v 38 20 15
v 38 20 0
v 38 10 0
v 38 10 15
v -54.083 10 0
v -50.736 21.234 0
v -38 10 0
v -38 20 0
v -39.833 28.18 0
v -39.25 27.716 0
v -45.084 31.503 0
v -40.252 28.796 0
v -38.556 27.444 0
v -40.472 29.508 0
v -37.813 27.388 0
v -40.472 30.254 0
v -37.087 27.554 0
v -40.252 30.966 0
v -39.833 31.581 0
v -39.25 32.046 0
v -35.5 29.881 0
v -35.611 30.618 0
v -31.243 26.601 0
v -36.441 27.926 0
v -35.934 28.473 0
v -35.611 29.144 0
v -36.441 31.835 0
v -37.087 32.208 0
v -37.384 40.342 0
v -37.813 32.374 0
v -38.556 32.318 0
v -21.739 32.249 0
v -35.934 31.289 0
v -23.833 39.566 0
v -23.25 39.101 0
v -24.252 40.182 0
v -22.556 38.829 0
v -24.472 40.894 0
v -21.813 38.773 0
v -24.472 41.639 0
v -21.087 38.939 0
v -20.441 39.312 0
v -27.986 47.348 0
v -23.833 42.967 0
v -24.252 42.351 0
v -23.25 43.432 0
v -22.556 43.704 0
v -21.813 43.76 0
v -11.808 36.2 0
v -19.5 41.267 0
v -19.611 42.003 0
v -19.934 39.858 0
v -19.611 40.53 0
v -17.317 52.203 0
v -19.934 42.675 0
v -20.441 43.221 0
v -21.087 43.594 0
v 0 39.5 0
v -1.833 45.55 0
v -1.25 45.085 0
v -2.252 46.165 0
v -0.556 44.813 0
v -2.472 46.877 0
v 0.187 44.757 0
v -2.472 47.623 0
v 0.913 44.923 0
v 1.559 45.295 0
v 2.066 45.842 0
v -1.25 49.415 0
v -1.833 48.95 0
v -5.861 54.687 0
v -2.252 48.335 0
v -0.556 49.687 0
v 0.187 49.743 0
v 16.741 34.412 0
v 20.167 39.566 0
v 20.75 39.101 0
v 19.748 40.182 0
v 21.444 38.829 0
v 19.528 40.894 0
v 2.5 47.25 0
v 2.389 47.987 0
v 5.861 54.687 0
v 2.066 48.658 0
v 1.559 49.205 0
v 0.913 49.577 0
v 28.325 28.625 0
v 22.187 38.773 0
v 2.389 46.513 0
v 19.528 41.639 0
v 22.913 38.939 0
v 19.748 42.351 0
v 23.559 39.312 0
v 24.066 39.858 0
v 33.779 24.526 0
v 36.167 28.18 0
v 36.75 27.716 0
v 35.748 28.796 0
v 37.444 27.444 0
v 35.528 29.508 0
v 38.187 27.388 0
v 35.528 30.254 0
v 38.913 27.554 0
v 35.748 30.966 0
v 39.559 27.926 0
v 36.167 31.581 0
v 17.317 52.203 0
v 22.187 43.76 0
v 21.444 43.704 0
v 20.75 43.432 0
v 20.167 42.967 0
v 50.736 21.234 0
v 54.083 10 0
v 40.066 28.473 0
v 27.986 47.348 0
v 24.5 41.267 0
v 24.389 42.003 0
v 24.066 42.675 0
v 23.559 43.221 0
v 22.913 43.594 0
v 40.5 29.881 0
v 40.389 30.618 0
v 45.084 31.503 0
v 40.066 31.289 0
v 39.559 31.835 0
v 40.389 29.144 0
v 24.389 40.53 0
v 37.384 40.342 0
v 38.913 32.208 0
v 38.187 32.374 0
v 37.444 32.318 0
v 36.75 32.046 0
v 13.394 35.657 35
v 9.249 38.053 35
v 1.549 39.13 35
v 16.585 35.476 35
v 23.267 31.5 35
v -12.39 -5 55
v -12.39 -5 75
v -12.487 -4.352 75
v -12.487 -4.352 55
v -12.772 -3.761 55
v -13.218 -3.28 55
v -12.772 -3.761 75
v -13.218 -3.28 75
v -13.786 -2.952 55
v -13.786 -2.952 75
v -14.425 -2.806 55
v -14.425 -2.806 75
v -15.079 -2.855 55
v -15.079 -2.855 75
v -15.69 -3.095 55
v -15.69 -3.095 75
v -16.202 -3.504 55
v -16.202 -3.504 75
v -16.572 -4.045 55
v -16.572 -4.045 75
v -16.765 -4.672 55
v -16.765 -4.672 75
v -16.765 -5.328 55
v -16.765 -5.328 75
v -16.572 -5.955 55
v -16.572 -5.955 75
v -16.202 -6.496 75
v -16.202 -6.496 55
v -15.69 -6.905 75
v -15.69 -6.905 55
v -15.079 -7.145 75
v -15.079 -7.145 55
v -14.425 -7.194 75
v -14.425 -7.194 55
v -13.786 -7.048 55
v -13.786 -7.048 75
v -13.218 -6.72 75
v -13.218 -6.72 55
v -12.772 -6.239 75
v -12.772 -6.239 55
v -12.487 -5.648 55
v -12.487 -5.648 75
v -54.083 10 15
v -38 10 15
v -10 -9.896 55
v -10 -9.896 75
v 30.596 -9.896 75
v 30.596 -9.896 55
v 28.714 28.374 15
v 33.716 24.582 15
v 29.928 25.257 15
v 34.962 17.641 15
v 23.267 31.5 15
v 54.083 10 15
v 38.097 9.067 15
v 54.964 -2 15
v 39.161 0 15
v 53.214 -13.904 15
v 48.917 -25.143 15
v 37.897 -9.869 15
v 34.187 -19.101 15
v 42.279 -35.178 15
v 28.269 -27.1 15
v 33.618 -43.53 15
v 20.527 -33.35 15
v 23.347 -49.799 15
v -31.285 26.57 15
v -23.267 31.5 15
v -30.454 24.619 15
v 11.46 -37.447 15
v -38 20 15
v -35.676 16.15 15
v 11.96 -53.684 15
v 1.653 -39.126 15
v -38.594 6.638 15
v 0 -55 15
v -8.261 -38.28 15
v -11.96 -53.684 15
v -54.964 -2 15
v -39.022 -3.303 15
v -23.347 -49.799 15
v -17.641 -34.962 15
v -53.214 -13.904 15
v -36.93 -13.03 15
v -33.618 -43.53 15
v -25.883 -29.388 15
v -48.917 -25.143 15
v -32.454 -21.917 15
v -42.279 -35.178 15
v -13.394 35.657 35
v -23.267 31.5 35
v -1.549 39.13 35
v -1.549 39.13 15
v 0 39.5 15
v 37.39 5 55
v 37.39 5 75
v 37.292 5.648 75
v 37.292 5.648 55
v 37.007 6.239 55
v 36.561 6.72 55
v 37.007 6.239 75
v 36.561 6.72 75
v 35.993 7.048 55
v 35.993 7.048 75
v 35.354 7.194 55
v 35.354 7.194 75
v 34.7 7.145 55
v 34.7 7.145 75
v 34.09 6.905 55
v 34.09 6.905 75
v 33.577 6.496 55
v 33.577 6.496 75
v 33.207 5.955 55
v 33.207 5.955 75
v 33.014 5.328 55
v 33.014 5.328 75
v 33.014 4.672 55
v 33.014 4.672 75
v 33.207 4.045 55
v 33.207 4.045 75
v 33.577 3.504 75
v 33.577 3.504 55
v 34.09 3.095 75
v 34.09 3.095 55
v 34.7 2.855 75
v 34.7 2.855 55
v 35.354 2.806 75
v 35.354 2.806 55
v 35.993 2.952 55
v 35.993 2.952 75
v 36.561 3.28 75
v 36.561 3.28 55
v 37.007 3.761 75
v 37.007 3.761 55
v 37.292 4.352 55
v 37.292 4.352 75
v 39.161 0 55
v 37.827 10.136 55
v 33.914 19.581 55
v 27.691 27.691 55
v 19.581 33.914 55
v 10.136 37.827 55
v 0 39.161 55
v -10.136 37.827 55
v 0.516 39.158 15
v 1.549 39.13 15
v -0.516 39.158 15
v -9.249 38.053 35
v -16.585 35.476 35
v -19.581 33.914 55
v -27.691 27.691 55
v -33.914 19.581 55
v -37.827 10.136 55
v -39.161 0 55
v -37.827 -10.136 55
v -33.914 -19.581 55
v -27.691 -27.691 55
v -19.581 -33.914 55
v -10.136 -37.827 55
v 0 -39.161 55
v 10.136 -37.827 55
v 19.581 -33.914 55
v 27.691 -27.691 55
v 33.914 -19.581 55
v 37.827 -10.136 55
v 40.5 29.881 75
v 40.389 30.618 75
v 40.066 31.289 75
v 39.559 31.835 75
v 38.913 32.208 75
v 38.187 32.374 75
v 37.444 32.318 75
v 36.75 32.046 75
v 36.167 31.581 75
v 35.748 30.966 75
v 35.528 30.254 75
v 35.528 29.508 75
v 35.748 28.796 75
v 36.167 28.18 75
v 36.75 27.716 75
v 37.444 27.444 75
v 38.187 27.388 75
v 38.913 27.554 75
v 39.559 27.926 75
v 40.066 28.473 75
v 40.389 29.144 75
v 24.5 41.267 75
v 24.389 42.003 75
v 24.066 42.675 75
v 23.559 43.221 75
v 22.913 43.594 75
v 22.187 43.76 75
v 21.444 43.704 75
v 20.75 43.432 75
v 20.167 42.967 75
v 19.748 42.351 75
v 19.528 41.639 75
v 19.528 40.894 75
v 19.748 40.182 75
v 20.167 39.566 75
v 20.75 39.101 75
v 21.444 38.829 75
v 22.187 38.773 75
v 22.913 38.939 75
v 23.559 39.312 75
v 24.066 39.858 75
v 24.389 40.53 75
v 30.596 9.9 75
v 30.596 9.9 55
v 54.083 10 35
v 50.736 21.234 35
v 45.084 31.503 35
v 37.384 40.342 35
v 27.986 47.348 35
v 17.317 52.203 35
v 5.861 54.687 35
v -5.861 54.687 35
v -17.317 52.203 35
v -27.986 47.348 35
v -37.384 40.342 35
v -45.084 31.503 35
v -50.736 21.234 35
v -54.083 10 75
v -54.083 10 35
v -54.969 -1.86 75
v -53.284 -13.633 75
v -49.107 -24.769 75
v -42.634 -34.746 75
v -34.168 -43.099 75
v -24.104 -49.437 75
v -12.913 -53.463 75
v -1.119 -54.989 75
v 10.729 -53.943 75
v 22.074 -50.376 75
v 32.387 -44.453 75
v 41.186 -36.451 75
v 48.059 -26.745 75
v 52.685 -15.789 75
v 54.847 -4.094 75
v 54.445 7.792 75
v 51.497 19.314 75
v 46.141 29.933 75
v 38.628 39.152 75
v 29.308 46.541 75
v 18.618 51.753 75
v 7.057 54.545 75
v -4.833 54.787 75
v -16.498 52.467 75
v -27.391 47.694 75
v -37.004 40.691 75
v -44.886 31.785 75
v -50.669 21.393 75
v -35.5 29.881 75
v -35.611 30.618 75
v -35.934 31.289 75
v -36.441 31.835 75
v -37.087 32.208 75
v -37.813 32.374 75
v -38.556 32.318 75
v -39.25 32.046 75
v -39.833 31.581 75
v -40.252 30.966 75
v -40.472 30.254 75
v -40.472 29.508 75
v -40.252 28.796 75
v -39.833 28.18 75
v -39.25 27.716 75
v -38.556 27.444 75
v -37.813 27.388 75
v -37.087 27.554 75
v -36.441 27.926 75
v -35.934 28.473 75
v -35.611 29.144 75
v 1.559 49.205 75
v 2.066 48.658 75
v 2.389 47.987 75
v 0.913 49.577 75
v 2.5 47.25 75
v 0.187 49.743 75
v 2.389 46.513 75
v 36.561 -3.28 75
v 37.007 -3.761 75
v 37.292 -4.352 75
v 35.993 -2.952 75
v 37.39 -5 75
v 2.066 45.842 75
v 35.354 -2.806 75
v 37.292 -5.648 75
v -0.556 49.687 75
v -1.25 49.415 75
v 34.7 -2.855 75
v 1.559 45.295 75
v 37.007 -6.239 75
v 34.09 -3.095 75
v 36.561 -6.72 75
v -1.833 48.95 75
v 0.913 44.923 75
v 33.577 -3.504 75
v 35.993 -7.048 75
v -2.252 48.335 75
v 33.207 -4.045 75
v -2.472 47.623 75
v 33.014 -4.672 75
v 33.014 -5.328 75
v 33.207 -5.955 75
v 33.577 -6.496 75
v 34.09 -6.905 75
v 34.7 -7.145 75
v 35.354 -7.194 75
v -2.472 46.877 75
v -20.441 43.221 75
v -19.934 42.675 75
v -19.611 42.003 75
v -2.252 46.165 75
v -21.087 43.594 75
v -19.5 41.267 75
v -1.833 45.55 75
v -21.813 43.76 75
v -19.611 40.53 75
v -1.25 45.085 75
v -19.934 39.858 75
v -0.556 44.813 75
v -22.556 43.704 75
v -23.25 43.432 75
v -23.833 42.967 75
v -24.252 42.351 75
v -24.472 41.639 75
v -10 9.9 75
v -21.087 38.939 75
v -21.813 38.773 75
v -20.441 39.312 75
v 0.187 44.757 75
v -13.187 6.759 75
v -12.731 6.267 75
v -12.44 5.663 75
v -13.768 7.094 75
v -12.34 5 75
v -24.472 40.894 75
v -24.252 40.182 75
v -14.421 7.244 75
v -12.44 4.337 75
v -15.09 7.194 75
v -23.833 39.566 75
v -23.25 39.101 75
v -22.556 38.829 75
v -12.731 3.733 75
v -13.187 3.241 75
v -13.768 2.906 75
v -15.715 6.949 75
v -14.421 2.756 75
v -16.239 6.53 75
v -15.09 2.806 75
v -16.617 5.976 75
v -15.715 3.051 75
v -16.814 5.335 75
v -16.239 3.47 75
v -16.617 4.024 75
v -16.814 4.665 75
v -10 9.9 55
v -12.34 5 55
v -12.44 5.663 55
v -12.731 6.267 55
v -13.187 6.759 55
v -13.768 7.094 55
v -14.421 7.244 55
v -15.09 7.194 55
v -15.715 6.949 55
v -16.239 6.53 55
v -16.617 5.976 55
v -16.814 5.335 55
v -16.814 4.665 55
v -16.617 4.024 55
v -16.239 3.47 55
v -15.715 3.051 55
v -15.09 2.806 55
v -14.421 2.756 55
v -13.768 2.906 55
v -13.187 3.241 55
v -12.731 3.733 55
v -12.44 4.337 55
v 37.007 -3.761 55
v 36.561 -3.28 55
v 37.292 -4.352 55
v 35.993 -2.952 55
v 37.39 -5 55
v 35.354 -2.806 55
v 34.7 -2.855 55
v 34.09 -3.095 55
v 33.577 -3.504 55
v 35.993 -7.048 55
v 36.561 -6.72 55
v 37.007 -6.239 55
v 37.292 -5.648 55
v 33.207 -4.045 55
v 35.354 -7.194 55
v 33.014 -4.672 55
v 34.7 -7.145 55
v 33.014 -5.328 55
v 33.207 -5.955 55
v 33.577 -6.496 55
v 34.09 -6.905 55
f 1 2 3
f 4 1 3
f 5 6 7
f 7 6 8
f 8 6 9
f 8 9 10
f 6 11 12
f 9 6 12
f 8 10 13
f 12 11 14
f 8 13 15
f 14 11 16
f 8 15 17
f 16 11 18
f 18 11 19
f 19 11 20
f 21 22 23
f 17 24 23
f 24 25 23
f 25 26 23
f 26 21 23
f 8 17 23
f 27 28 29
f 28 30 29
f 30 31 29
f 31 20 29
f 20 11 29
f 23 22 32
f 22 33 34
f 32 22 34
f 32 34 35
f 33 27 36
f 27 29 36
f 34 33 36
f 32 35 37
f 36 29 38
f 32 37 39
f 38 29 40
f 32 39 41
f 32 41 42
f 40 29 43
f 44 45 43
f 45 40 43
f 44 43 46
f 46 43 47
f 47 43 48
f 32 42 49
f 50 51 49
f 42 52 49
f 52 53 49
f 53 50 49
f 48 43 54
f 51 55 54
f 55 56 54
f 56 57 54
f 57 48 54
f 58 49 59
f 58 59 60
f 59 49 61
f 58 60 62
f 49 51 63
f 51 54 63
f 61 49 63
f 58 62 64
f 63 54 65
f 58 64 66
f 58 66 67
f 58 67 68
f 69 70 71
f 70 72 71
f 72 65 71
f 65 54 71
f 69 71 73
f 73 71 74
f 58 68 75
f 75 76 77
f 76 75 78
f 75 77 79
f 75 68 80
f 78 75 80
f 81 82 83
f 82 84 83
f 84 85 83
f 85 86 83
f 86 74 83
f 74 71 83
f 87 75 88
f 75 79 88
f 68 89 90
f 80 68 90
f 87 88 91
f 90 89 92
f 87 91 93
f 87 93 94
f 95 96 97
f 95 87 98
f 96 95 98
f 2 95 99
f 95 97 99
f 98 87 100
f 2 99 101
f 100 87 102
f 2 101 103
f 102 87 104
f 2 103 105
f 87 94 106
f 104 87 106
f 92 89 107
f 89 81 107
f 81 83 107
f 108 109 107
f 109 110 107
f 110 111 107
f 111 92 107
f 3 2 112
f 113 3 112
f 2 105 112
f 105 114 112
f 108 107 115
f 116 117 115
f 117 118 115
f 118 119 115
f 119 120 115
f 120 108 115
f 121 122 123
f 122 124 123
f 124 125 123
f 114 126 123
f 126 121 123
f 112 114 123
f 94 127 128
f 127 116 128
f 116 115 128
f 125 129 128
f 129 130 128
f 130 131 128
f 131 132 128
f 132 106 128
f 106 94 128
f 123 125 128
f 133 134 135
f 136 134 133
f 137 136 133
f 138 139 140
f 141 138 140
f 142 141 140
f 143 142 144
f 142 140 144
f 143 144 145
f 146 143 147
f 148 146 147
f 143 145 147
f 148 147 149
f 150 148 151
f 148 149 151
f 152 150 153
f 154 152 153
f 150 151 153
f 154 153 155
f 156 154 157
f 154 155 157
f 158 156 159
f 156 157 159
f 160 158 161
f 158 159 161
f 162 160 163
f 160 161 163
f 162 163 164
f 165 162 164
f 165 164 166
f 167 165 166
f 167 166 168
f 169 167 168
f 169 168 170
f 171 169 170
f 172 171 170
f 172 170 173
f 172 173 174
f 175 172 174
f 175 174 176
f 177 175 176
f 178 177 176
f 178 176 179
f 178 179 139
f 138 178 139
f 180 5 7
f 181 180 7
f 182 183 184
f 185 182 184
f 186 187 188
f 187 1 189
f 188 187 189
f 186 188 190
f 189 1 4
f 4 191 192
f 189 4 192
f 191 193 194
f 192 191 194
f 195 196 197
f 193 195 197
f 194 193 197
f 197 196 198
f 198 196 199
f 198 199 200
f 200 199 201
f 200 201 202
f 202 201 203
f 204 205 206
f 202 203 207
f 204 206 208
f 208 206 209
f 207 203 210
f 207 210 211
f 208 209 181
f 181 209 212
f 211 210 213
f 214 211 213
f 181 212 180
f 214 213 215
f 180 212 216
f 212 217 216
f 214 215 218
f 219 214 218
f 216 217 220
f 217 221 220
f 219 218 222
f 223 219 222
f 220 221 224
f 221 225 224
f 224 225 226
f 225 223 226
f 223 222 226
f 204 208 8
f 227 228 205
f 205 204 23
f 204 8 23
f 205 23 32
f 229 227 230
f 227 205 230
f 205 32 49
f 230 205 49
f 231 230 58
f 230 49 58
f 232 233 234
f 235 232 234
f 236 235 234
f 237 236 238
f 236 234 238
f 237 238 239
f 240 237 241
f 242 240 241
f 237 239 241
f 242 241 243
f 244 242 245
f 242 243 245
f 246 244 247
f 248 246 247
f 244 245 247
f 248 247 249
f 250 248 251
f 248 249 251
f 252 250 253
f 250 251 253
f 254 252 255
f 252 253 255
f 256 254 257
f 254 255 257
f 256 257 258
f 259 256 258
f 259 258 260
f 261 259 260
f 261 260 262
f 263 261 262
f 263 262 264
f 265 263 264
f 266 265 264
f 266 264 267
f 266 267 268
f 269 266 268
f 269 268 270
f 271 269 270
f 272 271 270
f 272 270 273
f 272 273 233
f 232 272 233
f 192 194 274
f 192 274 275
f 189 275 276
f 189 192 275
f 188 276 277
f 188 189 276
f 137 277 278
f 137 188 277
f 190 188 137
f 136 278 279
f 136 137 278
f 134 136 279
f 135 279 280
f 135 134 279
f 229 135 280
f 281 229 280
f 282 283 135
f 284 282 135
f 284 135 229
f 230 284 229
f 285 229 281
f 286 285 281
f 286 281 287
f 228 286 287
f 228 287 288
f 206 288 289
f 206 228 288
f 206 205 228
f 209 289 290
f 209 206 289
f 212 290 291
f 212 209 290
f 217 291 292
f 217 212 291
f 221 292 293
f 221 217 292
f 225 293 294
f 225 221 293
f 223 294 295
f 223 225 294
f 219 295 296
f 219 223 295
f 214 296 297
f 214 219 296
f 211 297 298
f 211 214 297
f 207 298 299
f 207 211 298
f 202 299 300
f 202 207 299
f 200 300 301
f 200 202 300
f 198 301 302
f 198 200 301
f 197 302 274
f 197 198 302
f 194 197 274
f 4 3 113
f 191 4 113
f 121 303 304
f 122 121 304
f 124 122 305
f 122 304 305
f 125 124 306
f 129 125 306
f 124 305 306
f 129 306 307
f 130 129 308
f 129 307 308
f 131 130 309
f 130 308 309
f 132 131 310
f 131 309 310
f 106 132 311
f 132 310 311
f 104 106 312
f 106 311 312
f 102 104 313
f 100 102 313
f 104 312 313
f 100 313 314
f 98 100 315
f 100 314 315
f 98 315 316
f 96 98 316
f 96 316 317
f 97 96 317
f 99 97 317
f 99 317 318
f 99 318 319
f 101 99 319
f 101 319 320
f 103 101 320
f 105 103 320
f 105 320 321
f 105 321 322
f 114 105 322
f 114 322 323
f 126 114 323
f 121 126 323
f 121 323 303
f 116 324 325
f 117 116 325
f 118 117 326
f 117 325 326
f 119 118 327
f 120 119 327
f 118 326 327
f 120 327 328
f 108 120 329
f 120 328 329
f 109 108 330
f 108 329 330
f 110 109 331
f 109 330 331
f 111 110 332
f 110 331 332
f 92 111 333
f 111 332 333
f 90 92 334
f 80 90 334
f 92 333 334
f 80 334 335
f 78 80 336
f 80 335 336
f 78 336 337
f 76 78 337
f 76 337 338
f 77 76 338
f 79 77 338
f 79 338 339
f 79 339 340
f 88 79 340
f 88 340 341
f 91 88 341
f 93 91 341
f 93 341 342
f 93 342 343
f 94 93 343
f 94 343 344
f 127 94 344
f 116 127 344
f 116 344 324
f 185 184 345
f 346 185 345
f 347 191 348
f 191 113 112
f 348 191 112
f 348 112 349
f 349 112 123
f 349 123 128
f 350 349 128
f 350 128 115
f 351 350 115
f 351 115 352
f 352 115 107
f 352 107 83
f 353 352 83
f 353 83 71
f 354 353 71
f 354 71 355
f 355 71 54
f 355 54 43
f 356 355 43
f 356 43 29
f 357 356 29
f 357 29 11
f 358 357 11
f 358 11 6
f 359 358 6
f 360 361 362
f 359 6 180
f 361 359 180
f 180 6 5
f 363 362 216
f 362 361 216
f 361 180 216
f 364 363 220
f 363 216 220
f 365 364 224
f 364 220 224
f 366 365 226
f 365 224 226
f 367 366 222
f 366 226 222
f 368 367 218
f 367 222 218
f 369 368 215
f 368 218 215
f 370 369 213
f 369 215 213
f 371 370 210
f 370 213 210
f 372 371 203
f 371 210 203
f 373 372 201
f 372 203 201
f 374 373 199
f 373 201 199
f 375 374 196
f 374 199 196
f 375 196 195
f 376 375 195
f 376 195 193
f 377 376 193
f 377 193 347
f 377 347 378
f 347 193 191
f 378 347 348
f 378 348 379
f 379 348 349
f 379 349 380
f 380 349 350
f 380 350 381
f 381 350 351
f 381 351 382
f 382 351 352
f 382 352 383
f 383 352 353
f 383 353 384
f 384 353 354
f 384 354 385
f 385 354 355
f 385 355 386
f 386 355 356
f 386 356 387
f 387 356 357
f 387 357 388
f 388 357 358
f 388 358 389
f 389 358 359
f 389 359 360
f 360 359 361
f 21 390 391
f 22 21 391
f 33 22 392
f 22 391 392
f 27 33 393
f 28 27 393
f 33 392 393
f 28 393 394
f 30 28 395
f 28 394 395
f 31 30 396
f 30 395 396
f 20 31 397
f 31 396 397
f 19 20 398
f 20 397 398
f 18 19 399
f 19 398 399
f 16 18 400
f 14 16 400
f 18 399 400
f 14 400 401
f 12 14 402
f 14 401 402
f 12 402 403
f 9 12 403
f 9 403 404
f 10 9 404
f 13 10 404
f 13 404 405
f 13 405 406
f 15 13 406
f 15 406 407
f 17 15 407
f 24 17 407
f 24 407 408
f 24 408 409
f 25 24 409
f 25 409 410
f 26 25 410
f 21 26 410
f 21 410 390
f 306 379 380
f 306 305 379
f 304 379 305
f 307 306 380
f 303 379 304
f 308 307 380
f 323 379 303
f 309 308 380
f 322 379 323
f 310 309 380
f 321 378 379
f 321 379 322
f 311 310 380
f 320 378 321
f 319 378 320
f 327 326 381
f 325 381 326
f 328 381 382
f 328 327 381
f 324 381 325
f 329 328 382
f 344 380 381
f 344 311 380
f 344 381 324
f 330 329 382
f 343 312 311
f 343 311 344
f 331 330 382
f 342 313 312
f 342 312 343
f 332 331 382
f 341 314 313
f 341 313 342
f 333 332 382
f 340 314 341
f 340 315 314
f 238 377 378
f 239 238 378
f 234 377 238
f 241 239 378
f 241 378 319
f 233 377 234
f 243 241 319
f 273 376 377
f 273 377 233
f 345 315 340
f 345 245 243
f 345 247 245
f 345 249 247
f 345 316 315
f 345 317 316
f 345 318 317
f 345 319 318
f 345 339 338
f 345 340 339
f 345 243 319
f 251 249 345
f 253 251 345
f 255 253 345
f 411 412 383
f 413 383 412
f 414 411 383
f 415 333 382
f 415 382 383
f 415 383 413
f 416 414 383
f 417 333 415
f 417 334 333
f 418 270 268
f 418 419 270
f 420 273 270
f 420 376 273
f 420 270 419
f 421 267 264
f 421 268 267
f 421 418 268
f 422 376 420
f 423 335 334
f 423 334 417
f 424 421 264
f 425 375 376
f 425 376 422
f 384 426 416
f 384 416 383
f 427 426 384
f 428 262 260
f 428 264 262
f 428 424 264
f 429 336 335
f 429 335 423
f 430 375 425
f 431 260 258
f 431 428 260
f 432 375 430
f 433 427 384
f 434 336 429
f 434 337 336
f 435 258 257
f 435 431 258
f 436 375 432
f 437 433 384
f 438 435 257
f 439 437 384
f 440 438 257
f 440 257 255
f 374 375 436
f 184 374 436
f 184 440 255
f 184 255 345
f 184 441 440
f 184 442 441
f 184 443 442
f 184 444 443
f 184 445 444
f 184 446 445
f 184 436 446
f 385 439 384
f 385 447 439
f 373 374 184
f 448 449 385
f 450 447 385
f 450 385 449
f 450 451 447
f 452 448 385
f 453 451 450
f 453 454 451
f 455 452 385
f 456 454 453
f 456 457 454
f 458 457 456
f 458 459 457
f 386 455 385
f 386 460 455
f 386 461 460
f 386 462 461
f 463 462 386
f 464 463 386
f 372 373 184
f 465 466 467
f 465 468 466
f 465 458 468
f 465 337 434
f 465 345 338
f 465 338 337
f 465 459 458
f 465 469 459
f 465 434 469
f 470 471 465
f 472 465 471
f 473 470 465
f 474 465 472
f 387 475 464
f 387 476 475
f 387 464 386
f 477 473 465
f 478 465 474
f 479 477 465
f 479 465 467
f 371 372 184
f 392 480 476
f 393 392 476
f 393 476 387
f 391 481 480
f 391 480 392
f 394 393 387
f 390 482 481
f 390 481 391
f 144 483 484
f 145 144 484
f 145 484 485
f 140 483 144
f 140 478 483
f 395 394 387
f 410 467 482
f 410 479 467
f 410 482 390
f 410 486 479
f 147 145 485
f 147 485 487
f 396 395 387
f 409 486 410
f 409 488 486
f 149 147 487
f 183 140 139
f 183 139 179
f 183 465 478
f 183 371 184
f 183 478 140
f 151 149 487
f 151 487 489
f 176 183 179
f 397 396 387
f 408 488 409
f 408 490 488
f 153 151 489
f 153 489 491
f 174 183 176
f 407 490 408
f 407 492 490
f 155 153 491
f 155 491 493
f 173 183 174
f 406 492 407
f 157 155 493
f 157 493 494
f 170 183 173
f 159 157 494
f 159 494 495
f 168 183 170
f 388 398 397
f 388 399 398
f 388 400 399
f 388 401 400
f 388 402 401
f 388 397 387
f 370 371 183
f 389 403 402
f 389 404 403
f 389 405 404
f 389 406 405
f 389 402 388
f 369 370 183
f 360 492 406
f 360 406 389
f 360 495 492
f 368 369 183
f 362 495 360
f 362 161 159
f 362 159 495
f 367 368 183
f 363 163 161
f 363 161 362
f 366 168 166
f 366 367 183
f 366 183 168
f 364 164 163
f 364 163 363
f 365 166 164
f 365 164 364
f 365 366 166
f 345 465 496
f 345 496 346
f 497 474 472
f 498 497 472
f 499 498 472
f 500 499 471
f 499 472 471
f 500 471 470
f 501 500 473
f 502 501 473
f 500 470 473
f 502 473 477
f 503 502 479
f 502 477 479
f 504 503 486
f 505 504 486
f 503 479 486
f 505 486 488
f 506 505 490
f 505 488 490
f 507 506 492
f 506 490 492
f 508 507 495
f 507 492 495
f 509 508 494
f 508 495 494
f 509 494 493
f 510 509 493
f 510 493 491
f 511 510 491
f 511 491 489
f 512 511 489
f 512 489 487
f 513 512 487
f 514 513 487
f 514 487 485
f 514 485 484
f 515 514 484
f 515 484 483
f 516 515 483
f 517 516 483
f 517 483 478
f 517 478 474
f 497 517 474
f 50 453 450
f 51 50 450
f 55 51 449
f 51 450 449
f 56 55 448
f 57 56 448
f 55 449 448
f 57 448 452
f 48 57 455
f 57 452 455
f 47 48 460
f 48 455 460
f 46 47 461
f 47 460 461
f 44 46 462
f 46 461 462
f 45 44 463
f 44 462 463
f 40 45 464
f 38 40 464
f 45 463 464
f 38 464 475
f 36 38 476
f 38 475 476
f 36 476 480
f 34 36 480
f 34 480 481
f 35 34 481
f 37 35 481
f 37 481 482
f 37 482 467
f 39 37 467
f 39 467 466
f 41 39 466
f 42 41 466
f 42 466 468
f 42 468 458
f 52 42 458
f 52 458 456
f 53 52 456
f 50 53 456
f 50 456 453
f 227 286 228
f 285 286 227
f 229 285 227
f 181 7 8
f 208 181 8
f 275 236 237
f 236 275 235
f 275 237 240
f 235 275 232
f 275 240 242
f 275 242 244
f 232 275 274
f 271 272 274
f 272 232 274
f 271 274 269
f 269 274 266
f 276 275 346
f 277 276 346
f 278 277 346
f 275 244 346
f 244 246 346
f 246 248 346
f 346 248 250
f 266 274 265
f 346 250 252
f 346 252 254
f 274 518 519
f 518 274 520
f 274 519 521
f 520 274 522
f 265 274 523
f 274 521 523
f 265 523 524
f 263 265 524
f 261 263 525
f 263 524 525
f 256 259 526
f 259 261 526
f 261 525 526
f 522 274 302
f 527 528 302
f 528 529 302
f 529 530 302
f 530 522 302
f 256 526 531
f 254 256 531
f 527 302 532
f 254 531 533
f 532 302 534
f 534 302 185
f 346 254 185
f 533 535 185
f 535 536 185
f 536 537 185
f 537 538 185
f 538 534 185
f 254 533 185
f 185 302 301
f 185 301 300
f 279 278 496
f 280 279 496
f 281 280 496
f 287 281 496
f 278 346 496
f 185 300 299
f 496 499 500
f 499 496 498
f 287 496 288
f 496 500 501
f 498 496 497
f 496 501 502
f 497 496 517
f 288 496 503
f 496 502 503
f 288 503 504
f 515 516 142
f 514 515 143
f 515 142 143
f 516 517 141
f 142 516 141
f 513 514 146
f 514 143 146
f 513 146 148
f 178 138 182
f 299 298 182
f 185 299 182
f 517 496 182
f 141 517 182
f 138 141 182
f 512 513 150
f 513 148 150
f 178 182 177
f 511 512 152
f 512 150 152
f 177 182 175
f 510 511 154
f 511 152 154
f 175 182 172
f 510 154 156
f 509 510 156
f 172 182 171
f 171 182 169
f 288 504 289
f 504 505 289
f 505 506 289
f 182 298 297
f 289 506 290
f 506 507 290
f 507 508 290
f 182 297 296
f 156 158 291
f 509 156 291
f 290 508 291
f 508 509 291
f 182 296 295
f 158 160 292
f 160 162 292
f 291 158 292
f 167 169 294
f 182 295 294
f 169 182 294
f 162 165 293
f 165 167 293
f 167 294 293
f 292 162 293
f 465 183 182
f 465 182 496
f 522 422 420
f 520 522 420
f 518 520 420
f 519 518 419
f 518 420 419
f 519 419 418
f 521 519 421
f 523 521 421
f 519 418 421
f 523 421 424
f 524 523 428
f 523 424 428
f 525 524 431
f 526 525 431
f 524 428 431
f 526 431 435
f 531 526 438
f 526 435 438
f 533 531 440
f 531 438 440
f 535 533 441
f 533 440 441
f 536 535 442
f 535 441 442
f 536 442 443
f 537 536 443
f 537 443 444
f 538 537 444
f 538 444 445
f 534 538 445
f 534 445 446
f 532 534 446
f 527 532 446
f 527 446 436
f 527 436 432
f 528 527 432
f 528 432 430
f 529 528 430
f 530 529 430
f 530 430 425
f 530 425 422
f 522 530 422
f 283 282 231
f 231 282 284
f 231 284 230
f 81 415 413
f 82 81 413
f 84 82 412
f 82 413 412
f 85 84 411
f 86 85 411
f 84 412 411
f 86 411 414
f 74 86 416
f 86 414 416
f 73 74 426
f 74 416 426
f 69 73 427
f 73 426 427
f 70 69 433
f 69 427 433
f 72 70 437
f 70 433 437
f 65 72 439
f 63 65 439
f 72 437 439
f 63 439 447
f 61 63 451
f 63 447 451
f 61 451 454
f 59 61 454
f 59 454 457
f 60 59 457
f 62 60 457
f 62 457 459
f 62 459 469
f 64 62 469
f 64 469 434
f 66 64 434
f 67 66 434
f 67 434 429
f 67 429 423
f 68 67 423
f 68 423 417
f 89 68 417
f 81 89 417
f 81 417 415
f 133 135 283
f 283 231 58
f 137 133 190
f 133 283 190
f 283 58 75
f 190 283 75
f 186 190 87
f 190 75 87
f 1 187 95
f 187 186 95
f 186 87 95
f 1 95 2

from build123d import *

# Parameters (mm, degrees)
BOSS_EXTRUDE1_DEPTH = 35
BOSS_EXTRUDE2_START = -20
SKETCH2_R           = 55
SKETCH2_R_2         = 39.161040577
BOSS_EXTRUDE2_DEPTH = 40
SKETCH4_R           = 55
BOSS_EXTRUDE3_DEPTH = 20
SKETCH5_R           = 3
CUT_EXTRUDE1_DEPTH  = 20
SKETCH6_R           = 2.5
CUT_EXTRUDE3_DEPTH  = 109.050914096
SKETCH8_R           = 2.25
SKETCH8_R_2         = 2.2
SKETCH8_W           = 40.596274726
SKETCH8_H           = 19.795896112
CUT_EXTRUDE5_DEPTH  = 30


with BuildPart() as part:
    # Sketch1 → Boss-Extrude1 (new body)
    with BuildSketch(Plane.XY):
        with BuildLine():
            add(Edge.make_bspline(
                [(-38, 20), (-28.167603026, 32.926551341), (0, 39.5)],
                knots=[0, 0, 0, 1, 1, 1], degree=2))
            add(Edge.make_bspline(
                [(0, 39.5), (28.167603026, 32.926551341), (38, 20)],
                knots=[0, 0, 0, 1, 1, 1], degree=2))
            Line((38, 20), (38, 10))
            Line((38, 10), (54.083269132, 10))
            ThreePointArc((54.083269132, 10), (0, 55), (-54.083269132, 10))
            Line((-54.083269132, 10), (-38, 10))
            Line((-38, 10), (-38, 20))
        make_face()
    extrude(amount=BOSS_EXTRUDE1_DEPTH)

    # Sketch2 → Boss-Extrude2 (add)
    with BuildSketch(Plane.XY.offset(35).offset(BOSS_EXTRUDE2_START)):
        with Locations(Location((0, 0, 0), (0, 0, 169.524318304))):
            Circle(SKETCH2_R)
        Circle(SKETCH2_R_2, mode=Mode.SUBTRACT)
    extrude(amount=BOSS_EXTRUDE2_DEPTH)

    # Sketch4 → Boss-Extrude3 (add)
    with BuildSketch(Plane.XY.offset(55)):
        with Locations(Location((0, 0, 0), (0, 0, 169.524318304))):
            Circle(SKETCH4_R)
    extrude(amount=BOSS_EXTRUDE3_DEPTH)

    # Sketch5 → Cut-Extrude1 (cut)
    with BuildSketch(Plane.XY.offset(75)):
        Circle(SKETCH5_R)
    extrude(amount=-CUT_EXTRUDE1_DEPTH, mode=Mode.SUBTRACT)

    # Sketch6 → Cut-Extrude3 (cut, through all)
    with BuildSketch(Plane.XY.offset(75)):
        with Locations((-38, 29.880895352)):
            Circle(SKETCH6_R)
        with Locations((-22, 41.266508356)):
            Circle(SKETCH6_R)
        with Locations((0, 47.25)):
            Circle(SKETCH6_R)
        with Locations((22, 41.266508356)):
            Circle(SKETCH6_R)
        with Locations((38, 29.880895352)):
            Circle(SKETCH6_R)
    extrude(amount=-CUT_EXTRUDE3_DEPTH, mode=Mode.SUBTRACT)

    # Sketch8 → Cut-Extrude5 (cut)
    with BuildSketch(Plane.XY.offset(75)):
        with Locations((-14.589613301, 5)):
            Circle(SKETCH8_R)
        with Locations((-14.589613301, -5)):
            Circle(SKETCH8_R_2)
        with Locations((35.189613301, 5)):
            Circle(SKETCH8_R_2)
        with Locations((35.189613301, -5)):
            Circle(SKETCH8_R_2)
        with Locations((10.298137363, 0.002051944)):
            Rectangle(SKETCH8_W, SKETCH8_H)
    extrude(amount=-CUT_EXTRUDE5_DEPTH, mode=Mode.SUBTRACT)


solid = part.part
